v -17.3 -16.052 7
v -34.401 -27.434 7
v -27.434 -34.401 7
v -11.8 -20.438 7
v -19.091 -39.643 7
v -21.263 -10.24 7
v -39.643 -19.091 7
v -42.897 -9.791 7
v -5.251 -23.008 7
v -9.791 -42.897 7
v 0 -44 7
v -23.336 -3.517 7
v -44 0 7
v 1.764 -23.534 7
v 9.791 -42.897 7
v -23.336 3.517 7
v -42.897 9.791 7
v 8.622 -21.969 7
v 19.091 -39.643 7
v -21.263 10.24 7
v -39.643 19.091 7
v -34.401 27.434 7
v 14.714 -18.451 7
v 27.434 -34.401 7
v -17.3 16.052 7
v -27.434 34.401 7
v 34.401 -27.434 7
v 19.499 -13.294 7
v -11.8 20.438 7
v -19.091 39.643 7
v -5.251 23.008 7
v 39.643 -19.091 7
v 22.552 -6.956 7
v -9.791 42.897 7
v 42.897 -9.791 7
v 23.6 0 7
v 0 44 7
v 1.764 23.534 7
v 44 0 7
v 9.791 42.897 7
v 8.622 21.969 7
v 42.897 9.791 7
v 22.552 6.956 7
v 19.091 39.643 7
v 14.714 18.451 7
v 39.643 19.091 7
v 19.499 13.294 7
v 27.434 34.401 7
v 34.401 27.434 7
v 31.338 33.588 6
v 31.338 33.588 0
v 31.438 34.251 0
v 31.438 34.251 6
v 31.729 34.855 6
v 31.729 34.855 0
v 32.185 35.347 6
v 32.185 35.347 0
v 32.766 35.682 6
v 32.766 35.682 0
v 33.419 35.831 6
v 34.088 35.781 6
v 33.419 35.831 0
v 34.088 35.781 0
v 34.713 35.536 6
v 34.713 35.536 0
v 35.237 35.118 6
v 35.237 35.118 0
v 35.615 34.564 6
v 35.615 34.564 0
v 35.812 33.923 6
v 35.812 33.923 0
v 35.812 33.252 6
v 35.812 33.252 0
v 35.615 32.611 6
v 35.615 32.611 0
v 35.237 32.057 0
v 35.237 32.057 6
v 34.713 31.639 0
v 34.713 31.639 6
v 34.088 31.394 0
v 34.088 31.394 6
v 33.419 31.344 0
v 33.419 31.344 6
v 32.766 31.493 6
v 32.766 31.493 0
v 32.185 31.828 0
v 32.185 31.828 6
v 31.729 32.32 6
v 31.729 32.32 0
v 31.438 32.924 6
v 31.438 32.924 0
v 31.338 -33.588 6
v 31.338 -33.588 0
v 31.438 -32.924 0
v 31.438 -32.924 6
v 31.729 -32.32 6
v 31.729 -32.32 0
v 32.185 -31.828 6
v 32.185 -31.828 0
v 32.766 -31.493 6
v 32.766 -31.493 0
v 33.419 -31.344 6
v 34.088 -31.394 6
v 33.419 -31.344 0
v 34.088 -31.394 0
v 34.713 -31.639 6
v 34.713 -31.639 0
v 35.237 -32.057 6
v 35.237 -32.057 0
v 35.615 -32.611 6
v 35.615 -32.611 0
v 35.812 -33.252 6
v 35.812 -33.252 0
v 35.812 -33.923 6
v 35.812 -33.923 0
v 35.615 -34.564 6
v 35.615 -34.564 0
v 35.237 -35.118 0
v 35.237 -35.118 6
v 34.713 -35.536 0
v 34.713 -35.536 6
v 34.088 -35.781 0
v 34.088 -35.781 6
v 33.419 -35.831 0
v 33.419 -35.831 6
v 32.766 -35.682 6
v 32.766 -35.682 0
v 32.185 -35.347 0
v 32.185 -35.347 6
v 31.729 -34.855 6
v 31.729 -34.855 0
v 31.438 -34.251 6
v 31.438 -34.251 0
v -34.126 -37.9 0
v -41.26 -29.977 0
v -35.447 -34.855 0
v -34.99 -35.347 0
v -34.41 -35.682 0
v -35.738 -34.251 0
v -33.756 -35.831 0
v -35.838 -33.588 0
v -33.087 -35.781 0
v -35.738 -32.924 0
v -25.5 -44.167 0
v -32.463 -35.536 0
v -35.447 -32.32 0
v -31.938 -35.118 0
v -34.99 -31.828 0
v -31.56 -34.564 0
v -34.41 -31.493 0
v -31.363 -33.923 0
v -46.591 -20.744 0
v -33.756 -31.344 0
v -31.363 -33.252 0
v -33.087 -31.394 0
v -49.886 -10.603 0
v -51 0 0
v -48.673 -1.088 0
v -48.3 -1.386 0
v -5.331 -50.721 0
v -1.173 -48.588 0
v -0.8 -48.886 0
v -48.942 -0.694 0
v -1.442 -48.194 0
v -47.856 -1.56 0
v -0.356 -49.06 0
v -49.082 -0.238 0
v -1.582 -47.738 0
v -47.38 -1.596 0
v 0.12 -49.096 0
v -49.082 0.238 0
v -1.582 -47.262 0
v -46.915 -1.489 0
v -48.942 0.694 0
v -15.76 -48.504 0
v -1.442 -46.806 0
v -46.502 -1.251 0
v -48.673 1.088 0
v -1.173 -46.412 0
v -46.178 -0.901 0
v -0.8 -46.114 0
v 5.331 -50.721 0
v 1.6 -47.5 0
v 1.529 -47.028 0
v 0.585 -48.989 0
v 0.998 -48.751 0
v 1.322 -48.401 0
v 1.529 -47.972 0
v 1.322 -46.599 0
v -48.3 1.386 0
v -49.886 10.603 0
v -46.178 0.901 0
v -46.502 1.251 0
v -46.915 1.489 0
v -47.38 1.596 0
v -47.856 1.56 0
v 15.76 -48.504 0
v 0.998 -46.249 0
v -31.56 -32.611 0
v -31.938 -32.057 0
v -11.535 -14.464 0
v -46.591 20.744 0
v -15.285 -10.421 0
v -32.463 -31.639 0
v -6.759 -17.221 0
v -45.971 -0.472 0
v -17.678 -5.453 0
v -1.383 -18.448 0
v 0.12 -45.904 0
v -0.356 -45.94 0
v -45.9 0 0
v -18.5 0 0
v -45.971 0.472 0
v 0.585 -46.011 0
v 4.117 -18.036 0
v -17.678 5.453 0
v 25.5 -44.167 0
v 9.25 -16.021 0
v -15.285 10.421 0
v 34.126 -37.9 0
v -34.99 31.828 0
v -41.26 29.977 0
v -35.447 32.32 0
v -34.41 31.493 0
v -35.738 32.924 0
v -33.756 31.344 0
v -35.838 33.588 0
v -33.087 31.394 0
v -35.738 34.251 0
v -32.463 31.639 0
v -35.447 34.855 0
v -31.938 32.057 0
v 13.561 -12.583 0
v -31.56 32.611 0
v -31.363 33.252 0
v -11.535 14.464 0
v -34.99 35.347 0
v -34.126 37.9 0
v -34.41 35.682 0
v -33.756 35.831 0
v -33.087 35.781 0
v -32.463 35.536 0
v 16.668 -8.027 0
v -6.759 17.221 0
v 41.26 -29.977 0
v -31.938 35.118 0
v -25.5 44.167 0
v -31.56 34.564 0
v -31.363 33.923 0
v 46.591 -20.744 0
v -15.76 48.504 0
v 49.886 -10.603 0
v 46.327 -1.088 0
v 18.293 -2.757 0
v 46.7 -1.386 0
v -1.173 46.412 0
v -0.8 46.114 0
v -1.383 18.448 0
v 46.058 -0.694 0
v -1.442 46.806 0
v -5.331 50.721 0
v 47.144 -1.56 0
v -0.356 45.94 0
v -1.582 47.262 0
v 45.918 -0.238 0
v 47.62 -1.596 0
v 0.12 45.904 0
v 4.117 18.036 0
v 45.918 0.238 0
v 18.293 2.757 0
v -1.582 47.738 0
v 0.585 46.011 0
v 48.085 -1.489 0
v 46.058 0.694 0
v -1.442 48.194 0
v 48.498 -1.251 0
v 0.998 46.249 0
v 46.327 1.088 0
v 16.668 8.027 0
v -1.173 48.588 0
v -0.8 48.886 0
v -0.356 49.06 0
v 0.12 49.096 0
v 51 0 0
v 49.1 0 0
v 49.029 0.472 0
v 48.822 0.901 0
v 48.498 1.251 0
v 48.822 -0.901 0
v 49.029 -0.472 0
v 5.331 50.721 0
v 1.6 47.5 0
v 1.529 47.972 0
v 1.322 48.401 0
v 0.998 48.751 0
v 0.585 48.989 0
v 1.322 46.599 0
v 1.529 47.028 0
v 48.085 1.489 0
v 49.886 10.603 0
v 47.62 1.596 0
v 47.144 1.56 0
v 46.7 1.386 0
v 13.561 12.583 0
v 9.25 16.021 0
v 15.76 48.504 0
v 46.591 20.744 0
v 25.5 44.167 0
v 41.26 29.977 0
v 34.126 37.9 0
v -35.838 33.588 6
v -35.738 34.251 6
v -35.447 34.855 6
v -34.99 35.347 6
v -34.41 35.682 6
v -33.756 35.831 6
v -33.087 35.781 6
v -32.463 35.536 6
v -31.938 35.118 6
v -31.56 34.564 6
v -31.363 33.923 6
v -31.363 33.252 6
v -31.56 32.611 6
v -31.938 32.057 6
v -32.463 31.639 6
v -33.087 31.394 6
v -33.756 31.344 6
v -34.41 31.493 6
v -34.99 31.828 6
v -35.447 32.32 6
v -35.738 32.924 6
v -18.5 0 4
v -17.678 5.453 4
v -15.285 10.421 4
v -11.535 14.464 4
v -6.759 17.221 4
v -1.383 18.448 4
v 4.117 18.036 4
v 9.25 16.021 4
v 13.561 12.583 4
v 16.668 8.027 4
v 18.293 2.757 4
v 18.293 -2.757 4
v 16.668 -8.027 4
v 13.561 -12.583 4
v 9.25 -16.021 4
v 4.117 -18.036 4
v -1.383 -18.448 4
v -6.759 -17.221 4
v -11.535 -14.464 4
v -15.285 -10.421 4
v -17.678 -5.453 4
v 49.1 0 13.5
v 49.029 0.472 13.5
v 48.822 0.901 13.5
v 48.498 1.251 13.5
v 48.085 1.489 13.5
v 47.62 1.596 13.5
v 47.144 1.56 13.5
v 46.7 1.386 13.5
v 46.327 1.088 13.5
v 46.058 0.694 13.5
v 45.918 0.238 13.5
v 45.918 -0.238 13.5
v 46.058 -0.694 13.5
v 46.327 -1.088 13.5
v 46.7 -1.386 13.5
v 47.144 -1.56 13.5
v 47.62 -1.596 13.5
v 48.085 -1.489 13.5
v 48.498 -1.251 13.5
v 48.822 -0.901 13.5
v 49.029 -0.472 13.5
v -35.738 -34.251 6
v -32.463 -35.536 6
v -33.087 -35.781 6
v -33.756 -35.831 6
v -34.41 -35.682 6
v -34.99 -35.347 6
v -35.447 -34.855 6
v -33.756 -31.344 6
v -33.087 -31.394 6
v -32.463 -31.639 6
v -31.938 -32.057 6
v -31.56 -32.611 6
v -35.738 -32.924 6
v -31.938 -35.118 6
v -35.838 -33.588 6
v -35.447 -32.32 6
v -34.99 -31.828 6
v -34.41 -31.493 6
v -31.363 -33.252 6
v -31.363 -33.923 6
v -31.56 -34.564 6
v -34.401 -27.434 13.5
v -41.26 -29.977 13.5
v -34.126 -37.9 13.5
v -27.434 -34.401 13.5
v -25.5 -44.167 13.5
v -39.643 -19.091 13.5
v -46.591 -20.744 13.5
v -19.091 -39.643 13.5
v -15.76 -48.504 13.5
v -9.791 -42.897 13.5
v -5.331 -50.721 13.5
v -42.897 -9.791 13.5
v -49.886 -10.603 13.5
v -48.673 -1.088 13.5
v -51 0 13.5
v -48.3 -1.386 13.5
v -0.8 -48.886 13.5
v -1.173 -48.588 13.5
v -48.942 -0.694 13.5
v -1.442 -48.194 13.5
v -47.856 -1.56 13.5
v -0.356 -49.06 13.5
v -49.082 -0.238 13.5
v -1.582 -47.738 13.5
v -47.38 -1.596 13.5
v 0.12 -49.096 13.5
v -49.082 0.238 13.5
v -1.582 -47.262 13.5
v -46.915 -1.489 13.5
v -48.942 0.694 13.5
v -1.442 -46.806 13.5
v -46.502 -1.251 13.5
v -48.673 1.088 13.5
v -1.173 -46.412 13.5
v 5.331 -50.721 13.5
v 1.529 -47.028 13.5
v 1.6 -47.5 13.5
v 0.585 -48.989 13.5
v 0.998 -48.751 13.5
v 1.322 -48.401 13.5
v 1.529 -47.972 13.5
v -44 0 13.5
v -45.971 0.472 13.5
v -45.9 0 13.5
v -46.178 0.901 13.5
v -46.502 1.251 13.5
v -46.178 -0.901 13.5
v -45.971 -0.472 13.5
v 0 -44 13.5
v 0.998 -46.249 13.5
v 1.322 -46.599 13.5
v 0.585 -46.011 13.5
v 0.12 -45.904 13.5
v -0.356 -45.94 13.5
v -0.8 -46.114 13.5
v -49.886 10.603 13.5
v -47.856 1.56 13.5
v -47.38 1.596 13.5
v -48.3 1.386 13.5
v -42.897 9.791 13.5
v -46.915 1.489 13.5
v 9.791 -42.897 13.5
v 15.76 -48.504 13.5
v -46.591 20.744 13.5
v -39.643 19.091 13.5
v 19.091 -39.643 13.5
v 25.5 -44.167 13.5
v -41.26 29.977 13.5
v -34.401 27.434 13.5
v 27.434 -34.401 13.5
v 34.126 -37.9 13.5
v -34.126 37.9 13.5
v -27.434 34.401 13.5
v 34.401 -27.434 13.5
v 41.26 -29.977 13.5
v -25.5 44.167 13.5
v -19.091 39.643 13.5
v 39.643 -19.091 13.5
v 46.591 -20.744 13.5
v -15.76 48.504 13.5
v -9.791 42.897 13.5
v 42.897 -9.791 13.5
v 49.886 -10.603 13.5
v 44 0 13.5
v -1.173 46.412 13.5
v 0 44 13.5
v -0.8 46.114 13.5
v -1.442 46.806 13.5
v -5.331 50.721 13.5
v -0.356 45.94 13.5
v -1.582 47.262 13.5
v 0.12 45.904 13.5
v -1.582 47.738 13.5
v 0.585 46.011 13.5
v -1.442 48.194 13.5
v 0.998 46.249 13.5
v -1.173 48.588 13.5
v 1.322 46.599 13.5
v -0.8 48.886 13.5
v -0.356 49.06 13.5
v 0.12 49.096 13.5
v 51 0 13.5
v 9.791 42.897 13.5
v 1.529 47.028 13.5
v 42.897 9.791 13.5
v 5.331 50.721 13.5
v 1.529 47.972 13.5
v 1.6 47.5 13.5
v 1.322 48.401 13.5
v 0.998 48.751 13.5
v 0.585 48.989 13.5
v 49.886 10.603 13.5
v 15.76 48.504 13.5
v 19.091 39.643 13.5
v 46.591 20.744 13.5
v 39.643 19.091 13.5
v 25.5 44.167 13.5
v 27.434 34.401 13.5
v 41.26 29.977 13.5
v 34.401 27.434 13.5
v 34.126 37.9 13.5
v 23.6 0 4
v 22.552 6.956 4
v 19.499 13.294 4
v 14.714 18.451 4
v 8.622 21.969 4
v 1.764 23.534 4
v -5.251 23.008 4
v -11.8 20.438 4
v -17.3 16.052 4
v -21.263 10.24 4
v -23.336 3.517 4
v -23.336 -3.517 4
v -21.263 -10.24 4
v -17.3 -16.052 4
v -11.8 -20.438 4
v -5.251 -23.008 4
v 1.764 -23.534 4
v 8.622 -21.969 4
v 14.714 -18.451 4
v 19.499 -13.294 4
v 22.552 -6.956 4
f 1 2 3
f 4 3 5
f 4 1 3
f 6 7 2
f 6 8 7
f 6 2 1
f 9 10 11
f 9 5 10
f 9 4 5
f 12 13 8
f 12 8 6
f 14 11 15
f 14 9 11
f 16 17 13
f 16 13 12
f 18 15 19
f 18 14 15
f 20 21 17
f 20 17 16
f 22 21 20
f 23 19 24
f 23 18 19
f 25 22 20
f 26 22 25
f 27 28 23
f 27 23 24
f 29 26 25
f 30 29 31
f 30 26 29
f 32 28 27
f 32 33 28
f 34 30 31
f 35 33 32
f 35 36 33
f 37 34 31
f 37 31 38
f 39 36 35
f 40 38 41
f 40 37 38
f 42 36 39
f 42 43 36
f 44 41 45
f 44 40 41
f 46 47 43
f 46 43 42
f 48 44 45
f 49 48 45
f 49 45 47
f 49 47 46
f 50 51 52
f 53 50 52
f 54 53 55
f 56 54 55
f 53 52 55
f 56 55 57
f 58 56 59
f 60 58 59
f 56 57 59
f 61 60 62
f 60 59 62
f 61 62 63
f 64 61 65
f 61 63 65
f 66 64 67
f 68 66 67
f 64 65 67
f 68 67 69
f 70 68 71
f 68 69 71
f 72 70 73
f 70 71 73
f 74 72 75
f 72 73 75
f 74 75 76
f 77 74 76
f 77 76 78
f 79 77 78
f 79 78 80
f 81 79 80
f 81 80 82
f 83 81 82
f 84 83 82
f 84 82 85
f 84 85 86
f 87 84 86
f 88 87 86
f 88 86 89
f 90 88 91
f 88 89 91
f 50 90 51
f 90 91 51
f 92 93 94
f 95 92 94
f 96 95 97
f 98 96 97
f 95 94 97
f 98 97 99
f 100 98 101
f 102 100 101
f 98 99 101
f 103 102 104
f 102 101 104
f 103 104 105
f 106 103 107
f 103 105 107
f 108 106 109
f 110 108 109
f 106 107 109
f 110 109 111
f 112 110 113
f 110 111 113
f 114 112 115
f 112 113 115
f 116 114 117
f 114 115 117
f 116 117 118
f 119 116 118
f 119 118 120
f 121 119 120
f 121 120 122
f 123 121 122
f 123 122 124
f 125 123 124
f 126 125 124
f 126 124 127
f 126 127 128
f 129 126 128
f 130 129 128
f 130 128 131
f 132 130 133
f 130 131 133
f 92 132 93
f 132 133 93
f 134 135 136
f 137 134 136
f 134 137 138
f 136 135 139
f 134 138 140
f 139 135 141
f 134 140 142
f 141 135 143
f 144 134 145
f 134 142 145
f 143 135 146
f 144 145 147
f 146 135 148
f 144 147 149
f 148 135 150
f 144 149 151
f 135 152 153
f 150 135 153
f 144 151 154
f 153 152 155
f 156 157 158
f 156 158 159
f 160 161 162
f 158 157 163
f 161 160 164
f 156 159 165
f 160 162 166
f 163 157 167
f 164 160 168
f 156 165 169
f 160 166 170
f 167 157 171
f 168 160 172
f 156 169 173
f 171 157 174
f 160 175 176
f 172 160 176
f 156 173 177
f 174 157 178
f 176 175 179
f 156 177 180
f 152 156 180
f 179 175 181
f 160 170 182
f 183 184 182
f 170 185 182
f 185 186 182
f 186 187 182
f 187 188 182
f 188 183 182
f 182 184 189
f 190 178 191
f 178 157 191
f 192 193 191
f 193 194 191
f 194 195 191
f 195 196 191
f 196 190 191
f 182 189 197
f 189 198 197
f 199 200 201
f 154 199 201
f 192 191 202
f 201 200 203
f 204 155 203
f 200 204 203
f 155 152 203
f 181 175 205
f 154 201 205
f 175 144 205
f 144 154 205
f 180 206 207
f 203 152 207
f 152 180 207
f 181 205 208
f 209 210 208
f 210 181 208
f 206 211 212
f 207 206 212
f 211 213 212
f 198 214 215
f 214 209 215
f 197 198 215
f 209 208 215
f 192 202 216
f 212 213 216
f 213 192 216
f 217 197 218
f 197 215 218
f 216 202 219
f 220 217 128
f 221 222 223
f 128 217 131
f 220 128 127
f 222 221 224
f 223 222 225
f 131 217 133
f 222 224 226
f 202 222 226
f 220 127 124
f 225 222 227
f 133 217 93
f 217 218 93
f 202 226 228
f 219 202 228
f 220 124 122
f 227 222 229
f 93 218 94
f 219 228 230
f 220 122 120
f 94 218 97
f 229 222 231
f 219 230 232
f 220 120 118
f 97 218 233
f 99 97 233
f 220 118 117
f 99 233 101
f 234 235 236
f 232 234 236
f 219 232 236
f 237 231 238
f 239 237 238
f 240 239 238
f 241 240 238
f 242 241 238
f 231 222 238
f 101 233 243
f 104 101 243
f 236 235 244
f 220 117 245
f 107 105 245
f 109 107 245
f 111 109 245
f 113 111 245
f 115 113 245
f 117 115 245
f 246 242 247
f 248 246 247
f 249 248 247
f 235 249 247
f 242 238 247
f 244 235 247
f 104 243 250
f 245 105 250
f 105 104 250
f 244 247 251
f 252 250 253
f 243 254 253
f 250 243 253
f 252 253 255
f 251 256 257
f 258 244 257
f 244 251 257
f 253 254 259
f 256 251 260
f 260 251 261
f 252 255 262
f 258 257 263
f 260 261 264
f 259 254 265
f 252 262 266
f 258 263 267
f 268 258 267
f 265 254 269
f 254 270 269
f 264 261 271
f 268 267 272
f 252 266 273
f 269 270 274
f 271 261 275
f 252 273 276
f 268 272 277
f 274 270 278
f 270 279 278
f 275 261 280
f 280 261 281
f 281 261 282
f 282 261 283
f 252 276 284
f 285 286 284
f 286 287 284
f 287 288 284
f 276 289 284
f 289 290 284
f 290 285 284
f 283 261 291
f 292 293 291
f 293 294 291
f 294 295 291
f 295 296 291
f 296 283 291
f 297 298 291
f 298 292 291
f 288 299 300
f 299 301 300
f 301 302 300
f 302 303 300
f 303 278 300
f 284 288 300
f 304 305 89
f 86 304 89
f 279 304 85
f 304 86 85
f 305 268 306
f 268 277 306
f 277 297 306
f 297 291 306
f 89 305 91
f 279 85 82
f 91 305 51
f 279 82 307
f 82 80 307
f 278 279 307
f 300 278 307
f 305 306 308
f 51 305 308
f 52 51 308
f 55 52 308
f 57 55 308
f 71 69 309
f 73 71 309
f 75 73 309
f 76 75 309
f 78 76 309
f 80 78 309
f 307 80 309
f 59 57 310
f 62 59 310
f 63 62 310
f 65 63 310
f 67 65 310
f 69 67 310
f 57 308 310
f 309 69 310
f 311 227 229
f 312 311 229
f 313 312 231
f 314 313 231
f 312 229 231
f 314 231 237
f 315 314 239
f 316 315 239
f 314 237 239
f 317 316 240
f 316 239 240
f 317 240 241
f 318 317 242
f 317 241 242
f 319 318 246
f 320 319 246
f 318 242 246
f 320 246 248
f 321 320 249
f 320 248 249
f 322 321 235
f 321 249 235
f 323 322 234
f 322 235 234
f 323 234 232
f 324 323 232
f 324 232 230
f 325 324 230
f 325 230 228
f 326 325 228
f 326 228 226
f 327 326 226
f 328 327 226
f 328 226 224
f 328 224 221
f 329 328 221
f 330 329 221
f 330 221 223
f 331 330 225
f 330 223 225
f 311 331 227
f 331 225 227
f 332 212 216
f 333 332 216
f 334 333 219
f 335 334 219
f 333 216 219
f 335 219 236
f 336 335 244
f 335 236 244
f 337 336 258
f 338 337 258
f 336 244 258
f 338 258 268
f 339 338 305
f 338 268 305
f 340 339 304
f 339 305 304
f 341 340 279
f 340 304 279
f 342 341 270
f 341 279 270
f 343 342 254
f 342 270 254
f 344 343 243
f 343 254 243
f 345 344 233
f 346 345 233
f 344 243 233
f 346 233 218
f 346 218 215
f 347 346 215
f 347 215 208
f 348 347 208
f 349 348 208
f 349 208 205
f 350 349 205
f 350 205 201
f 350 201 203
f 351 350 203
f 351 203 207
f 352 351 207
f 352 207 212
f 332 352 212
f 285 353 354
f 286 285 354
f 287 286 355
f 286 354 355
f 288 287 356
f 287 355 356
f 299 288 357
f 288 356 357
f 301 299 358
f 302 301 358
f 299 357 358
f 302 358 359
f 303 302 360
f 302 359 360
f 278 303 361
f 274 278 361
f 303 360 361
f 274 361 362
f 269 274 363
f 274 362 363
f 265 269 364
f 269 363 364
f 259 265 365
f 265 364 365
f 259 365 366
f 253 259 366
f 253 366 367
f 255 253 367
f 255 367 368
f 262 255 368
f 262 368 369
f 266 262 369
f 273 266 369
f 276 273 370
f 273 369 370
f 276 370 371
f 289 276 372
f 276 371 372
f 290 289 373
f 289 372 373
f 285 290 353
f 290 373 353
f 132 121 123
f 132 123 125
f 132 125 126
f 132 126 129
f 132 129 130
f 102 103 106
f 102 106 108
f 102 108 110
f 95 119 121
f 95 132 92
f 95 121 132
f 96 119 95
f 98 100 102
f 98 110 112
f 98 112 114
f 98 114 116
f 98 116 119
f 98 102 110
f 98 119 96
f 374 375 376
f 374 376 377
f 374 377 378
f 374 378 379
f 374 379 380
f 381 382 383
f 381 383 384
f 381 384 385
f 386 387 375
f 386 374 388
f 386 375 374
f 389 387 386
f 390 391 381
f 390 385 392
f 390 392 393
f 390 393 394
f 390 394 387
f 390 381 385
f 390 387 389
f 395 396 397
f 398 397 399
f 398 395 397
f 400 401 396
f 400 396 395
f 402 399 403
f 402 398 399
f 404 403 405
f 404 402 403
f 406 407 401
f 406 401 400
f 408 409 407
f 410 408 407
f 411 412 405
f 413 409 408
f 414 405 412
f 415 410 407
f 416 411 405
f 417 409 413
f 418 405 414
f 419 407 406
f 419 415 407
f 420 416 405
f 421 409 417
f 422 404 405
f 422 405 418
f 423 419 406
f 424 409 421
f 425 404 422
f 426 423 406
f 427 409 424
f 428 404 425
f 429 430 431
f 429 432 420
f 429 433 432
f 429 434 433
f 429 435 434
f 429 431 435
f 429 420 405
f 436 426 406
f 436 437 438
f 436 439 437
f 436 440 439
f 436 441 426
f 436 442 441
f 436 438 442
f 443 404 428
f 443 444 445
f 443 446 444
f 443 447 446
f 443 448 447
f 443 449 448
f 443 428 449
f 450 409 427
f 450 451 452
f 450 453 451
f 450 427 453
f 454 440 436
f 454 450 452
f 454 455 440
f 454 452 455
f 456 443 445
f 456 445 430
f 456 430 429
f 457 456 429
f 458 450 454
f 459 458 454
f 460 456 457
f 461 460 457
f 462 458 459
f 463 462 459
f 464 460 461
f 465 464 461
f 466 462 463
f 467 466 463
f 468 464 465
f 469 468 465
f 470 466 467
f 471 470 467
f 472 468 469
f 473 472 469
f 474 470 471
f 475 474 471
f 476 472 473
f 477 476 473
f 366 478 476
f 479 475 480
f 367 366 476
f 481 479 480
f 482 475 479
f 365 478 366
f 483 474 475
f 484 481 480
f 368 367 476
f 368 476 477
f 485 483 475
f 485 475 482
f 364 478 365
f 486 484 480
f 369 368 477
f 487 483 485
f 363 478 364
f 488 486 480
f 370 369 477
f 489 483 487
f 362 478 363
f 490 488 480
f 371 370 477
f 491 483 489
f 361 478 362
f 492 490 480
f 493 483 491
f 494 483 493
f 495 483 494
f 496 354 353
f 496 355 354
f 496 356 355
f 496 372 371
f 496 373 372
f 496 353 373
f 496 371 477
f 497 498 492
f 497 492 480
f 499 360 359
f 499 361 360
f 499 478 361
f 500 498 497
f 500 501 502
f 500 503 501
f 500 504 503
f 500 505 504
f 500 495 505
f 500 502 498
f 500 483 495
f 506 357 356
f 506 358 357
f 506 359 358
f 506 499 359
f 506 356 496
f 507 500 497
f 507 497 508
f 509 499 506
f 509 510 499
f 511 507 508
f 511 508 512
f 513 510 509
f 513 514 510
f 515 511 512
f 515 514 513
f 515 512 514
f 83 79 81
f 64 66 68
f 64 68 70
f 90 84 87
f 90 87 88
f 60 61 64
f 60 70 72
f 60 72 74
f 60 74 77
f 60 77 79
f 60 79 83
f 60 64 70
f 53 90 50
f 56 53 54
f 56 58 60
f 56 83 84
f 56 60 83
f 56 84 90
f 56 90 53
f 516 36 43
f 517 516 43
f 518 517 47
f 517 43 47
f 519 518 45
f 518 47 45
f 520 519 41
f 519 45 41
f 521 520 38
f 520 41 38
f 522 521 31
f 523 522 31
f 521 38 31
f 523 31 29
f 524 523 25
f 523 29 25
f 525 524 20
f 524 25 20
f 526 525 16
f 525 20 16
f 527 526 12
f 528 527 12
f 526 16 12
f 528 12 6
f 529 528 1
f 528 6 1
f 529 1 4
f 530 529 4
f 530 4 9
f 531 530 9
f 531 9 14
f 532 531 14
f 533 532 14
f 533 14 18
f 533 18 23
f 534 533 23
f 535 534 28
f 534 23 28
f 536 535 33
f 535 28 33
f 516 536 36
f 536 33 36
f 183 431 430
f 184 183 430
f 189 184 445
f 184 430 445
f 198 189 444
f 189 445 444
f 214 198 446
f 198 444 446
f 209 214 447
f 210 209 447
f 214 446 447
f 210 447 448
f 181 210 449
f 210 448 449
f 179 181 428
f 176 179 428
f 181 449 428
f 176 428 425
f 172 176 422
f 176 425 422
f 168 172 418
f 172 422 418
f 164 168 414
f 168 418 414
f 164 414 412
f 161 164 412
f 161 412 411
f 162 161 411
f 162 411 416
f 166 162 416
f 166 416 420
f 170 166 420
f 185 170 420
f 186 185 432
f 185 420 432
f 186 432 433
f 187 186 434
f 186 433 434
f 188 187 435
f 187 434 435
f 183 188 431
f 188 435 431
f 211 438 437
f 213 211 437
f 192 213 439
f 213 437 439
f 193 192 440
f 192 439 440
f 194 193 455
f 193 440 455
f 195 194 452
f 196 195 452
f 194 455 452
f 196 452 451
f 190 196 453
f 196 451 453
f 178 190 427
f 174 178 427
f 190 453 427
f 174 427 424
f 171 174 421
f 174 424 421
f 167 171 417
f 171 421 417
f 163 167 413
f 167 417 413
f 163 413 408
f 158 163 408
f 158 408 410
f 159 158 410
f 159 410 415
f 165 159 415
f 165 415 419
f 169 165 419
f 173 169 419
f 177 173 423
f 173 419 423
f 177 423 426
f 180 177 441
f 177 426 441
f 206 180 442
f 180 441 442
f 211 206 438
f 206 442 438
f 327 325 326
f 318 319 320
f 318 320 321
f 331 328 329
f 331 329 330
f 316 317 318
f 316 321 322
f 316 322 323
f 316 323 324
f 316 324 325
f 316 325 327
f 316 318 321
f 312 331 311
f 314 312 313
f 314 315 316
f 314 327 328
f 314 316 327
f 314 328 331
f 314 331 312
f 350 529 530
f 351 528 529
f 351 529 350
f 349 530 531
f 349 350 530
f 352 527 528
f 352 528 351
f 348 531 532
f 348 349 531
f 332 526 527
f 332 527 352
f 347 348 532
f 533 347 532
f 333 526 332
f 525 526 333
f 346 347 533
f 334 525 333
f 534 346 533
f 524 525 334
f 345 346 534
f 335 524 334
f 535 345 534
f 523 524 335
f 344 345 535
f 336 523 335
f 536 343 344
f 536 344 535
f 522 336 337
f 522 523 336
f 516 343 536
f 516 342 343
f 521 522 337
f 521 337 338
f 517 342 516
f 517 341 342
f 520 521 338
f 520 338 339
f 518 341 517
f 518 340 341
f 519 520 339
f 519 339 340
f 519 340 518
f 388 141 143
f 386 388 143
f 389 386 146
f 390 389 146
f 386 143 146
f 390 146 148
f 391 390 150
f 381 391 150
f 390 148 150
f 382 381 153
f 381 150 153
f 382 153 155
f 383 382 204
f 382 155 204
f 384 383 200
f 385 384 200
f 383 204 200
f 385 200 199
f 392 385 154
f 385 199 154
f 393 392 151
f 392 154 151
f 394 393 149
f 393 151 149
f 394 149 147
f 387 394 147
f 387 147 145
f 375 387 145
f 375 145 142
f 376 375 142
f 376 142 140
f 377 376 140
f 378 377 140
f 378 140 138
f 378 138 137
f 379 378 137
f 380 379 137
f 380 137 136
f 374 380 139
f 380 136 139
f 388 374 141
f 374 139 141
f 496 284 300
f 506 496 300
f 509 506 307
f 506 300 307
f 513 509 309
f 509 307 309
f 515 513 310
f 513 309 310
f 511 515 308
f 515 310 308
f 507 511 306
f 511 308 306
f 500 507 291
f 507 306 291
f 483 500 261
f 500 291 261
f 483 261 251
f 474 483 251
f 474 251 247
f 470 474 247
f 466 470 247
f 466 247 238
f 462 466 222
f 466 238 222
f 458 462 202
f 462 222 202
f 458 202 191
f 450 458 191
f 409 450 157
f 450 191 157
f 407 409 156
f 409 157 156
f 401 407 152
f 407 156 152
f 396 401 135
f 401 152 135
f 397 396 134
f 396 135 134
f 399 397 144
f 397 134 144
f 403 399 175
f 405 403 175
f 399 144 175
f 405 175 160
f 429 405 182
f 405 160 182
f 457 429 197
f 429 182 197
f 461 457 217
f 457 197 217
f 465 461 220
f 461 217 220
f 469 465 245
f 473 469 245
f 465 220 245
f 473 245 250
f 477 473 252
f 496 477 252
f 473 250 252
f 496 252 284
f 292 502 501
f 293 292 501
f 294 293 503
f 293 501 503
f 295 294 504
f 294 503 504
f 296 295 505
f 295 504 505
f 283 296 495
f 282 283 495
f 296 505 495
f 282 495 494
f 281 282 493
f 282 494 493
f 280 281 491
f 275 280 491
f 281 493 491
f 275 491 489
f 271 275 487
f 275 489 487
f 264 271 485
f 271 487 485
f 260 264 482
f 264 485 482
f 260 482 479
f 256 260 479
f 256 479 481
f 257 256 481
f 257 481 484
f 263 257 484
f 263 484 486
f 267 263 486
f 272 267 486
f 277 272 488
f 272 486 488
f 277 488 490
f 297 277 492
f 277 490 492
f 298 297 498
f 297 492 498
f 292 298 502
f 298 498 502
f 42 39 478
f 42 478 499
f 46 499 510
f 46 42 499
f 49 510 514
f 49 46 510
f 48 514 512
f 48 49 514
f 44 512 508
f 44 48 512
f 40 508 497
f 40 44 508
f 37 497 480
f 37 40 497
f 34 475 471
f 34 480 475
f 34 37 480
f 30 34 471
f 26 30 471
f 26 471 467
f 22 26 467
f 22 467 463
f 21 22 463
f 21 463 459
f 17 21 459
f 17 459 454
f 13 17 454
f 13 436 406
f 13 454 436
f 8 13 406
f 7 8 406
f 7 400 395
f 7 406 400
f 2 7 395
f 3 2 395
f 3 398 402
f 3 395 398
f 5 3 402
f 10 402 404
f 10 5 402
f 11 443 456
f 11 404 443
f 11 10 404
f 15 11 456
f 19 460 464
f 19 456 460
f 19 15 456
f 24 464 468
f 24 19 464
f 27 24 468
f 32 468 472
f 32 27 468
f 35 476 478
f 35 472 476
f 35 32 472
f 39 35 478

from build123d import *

# Parameters (mm, degrees)
SKETCH1_R           = 51
BOSS_EXTRUDE1_DEPTH = 13.5
SHELL1_T            = -7
SKETCH2_R           = 18.5
CUT_EXTRUDE1_DEPTH  = 7
SKETCH3_R           = 23.6
CUT_EXTRUDE2_DEPTH  = 3
SKETCH5_R           = 1.6
CUT_EXTRUDE3_DEPTH  = 13.5
SKETCH6_R           = 2.25
CUT_EXTRUDE4_DEPTH  = 6


with BuildPart() as part:
    # Sketch1 → Boss-Extrude1 (new body)
    with BuildSketch(Plane.XY):
        Circle(SKETCH1_R)
    extrude(amount=BOSS_EXTRUDE1_DEPTH)

    # Shell1
    shell1_openings = [part.faces().sort_by_distance(p)[0] for p in [
        (0, 0, 13.5),
    ]]
    offset(amount=SHELL1_T, openings=shell1_openings, kind=Kind.INTERSECTION)

    # Sketch2 → Cut-Extrude1 (cut)
    with BuildSketch(Plane(origin=(0, 0, 0), x_dir=(-1, 0, 0), z_dir=(0, 0, -1))):
        Circle(SKETCH2_R)
    extrude(amount=-CUT_EXTRUDE1_DEPTH, mode=Mode.SUBTRACT)

    # Sketch3 → Cut-Extrude2 (cut)
    with BuildSketch(Plane.XY.offset(7)):
        Circle(SKETCH3_R)
    extrude(amount=-CUT_EXTRUDE2_DEPTH, mode=Mode.SUBTRACT)

    # Sketch5 → Cut-Extrude3 (cut)
    with BuildSketch(Plane.XY.offset(13.5)):
        with Locations((0, 47.5)):
            Circle(SKETCH5_R)
        with Locations((47.5, 0)):
            Circle(SKETCH5_R)
        with Locations((0, -47.5)):
            Circle(SKETCH5_R)
        with Locations((-47.5, 0)):
            Circle(SKETCH5_R)
    extrude(amount=-CUT_EXTRUDE3_DEPTH, mode=Mode.SUBTRACT)

    # Sketch6 → Cut-Extrude4 (cut)
    with BuildSketch(Plane(origin=(0, 0, 0), x_dir=(-1, 0, 0), z_dir=(0, 0, -1))):
        with Locations((-33.587572106, 33.587572106)):
            Circle(SKETCH6_R)
        with Locations((33.587572106, 33.587572106)):
            Circle(SKETCH6_R)
        with Locations((33.587572106, -33.587572106)):
            Circle(SKETCH6_R)
        with Locations((-33.587572106, -33.587572106)):
            Circle(SKETCH6_R)
    extrude(amount=-CUT_EXTRUDE4_DEPTH, mode=Mode.SUBTRACT)


solid = part.part
